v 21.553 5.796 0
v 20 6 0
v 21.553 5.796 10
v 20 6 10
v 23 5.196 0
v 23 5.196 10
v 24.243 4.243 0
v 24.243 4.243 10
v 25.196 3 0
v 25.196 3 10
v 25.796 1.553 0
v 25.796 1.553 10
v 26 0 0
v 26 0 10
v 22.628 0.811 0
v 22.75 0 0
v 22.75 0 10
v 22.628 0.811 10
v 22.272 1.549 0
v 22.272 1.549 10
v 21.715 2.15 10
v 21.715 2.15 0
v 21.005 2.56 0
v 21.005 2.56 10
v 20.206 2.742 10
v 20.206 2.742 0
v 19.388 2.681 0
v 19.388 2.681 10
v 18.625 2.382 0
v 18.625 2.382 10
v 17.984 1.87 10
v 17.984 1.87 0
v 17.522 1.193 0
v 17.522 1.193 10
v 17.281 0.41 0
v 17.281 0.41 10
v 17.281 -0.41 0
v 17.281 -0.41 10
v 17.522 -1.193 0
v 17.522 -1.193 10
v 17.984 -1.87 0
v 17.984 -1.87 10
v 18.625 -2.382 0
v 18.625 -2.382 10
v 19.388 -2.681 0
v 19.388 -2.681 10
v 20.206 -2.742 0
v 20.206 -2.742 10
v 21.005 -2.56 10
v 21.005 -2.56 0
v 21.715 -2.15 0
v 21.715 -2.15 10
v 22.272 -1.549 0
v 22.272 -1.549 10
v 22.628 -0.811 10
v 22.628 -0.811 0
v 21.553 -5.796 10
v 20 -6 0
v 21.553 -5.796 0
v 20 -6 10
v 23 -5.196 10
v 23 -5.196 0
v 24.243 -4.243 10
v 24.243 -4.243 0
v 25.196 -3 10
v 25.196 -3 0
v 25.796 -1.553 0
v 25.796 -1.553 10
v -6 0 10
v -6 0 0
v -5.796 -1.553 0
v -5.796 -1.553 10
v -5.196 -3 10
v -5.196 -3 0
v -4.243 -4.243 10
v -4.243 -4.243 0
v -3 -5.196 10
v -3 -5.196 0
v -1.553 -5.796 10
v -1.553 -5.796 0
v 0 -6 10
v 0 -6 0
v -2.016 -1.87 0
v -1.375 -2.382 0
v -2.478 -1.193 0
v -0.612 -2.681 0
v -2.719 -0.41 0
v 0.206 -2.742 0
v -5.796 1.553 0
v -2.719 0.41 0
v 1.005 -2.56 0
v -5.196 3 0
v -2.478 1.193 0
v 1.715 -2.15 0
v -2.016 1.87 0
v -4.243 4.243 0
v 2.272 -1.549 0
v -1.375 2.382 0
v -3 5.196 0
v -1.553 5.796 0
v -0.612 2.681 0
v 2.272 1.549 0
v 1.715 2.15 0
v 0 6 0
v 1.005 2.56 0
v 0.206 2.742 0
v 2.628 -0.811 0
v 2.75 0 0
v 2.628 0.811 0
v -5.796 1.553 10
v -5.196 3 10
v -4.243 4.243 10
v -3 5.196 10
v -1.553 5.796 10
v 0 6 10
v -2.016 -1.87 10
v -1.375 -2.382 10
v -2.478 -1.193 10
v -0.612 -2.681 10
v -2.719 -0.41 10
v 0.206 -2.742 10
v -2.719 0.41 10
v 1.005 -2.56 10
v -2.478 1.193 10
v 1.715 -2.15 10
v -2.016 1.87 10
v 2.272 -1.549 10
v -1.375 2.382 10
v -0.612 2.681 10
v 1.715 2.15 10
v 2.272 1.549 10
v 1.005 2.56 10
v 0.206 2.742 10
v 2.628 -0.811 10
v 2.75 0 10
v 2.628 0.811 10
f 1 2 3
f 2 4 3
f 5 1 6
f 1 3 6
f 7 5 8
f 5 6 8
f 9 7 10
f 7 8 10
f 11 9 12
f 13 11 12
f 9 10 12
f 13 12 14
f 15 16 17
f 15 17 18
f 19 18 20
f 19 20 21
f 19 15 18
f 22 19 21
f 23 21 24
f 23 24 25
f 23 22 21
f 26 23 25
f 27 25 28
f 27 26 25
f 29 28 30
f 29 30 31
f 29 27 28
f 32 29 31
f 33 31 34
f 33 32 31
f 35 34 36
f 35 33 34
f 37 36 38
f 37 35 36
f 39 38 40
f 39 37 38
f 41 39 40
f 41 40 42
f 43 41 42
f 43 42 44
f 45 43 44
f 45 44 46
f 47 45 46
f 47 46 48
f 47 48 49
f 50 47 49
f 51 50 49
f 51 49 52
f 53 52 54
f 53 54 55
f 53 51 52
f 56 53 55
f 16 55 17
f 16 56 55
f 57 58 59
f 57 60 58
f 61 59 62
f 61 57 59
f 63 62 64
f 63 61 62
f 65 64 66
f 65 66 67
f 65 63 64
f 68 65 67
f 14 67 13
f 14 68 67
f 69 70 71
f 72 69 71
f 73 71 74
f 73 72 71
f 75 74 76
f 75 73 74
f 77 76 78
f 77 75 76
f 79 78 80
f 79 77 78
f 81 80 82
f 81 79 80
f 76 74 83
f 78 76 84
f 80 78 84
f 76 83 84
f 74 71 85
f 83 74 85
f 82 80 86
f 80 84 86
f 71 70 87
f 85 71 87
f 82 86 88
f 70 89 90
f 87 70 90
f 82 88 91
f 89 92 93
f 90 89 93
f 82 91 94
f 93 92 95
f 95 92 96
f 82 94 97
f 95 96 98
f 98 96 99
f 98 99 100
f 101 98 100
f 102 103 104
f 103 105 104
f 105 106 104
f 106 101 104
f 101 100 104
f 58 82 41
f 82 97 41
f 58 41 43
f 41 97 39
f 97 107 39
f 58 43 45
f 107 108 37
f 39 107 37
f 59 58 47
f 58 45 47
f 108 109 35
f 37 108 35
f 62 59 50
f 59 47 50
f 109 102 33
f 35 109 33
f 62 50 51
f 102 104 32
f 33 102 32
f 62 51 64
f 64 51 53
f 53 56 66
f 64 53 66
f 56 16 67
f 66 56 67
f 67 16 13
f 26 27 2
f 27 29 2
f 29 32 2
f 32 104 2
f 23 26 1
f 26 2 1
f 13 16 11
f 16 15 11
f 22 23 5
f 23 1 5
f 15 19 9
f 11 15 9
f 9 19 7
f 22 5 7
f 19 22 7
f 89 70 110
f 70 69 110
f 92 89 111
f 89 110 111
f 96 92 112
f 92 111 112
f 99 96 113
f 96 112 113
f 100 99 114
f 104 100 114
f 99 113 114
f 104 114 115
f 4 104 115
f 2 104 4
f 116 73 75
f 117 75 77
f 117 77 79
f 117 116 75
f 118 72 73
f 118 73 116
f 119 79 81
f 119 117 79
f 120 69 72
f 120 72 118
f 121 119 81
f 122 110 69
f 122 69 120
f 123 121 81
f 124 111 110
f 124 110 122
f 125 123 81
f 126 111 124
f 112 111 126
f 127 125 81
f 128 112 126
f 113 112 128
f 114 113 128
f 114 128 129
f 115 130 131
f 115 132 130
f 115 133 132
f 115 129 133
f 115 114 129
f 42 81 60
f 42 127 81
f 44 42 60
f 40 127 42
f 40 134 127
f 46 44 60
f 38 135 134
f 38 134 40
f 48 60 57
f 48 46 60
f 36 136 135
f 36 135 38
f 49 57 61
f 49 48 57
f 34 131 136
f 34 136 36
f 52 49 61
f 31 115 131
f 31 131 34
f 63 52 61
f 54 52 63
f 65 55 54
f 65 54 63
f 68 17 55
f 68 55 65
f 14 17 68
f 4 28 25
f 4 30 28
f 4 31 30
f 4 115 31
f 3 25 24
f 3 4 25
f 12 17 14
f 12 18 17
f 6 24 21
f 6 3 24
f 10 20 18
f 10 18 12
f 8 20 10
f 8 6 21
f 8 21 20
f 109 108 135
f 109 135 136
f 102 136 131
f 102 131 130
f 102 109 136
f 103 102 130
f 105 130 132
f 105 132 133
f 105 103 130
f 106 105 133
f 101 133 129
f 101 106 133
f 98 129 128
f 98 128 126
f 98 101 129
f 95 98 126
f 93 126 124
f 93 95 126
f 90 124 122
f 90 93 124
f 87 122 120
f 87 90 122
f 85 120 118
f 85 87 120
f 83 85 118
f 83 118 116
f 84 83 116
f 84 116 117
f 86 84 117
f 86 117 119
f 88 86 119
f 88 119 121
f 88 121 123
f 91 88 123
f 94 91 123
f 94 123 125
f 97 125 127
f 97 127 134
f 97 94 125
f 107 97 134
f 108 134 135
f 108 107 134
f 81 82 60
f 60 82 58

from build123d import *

# Parameters (mm, degrees)
F0_W     = 32
F0_H     = 12
F0_R     = 2.75
F1_DEPTH = 10
F2_R     = 5.99999


# Not quite as in the source:
# - a fillet or chamfer is up to 0.001 mm smaller than in the source, because OpenCascade refuses the exact size


with BuildPart() as f1:
    # F0 (on Top) → F1 (new body)
    with BuildSketch(Plane.XY):
        with Locations((10, 0)):
            Rectangle(F0_W, F0_H)
        Circle(F0_R, mode=Mode.SUBTRACT)
        with Locations((20, 0)):
            Circle(F0_R, mode=Mode.SUBTRACT)
    extrude(amount=F1_DEPTH)

    # F2 (radius 6 in the source; OpenCascade refuses exactly that, so slightly less here)
    f2_edges = [f1.edges().sort_by_distance(p)[0] for p in [
        (-6, -6, 5),
        (-6, 6, 5),
        (26, -6, 5),
        (26, 6, 5),
    ]]
    fillet(f2_edges, radius=F2_R)


solid = f1.part
